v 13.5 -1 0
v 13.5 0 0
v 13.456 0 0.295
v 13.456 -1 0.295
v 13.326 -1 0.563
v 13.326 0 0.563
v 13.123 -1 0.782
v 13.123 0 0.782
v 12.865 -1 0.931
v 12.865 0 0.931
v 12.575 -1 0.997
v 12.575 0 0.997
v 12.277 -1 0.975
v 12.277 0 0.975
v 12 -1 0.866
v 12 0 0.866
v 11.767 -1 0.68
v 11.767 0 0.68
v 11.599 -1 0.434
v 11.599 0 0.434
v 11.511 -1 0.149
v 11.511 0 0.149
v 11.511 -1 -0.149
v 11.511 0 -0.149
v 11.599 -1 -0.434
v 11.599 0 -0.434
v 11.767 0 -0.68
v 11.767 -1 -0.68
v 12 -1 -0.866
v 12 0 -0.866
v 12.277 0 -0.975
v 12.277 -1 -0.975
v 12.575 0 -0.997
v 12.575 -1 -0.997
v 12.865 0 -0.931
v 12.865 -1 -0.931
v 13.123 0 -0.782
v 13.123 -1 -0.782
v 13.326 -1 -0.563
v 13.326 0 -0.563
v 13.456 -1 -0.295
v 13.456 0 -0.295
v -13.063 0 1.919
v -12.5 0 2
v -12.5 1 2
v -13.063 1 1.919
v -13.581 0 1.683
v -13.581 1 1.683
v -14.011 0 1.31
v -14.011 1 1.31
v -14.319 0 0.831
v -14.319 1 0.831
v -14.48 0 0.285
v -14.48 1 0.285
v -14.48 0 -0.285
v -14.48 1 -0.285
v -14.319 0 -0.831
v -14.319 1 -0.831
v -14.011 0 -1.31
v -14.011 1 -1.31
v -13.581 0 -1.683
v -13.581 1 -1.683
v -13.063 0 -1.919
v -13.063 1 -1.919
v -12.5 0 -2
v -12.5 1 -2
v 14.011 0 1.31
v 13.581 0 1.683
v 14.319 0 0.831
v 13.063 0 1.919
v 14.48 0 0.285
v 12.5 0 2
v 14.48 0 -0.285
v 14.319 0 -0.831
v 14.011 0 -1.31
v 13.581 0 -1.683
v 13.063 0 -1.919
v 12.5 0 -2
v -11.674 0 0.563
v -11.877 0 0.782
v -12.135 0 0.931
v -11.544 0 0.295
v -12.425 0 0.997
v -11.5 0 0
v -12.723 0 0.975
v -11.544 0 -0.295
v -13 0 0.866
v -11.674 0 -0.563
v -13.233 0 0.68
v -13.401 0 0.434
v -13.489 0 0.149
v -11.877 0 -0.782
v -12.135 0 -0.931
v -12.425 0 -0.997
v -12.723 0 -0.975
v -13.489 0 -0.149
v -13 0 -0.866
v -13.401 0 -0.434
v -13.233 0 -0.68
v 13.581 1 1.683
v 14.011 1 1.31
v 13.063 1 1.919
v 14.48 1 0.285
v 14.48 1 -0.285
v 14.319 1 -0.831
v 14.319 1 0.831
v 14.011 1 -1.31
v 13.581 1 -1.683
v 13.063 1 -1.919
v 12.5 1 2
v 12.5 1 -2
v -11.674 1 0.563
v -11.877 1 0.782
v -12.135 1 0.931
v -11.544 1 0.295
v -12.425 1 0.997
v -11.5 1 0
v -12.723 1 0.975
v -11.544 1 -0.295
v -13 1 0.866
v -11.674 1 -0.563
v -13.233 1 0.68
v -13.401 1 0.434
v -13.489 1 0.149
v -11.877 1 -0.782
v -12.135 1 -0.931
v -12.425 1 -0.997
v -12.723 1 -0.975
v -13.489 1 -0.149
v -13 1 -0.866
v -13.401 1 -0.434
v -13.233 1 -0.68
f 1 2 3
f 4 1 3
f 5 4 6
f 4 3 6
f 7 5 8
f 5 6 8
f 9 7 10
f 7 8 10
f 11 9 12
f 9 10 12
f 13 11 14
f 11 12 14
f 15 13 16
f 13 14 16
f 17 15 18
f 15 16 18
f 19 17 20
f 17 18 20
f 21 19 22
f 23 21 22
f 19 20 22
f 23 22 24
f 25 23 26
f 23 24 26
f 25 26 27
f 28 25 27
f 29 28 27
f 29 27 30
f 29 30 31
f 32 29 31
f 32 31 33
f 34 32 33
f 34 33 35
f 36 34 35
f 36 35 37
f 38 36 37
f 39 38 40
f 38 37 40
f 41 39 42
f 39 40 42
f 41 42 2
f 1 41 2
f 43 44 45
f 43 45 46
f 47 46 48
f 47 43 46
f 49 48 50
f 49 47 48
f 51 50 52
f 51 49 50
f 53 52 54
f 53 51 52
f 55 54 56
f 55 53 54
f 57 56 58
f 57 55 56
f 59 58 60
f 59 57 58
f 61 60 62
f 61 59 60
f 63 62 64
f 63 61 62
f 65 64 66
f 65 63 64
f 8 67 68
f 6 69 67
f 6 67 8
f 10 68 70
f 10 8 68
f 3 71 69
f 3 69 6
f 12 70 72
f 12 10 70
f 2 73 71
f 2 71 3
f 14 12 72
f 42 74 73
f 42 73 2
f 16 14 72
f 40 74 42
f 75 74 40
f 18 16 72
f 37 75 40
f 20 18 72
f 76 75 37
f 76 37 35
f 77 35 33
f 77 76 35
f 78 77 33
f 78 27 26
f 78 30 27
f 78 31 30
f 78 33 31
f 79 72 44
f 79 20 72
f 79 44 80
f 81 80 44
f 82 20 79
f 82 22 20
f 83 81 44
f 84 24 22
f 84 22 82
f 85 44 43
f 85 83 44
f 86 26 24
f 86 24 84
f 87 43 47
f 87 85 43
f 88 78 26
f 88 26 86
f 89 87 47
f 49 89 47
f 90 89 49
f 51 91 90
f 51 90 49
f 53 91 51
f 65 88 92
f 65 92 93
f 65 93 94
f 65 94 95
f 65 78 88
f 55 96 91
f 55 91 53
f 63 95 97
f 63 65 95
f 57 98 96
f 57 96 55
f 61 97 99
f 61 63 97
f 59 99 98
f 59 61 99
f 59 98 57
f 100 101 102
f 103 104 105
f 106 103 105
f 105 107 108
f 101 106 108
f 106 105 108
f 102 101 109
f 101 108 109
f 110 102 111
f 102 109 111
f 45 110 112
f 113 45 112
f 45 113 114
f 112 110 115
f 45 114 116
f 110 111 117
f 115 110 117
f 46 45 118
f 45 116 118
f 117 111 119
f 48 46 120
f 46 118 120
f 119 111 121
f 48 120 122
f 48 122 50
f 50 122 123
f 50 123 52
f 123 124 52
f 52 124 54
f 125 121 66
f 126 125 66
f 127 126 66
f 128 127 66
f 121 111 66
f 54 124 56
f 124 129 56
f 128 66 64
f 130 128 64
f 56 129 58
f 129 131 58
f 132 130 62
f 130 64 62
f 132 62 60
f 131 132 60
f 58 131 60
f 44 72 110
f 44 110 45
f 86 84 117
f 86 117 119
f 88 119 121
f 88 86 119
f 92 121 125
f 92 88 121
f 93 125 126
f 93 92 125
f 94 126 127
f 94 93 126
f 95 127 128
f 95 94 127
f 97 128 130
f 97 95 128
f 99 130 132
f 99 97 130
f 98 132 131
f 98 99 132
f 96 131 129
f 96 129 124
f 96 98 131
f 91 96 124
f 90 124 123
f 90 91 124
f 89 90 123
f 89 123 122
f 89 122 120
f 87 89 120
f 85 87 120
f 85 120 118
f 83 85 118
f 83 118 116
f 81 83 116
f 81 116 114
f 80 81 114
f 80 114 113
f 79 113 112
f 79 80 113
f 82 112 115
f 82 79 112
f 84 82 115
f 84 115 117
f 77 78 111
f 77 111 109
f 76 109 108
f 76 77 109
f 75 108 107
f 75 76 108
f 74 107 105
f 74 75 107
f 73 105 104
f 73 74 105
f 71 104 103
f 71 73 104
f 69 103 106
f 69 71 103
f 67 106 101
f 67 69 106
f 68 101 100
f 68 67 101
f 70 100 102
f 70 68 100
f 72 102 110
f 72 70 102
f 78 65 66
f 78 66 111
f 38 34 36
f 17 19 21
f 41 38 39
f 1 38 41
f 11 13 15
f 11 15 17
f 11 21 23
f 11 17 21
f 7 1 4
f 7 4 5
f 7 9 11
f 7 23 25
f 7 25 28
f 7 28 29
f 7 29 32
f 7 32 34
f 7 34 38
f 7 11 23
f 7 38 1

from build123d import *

# Parameters (mm, degrees)
SKETCH1_R           = 1
BOSS_EXTRUDE2_DEPTH = 1
SKETCH5_R           = 1
BOSS_EXTRUDE3_DEPTH = 1


with BuildPart() as part:
    # Sketch1 → Boss-Extrude2 (new body)
    with BuildSketch(Plane(origin=(0, 0, 0), x_dir=(1, 0, 0), z_dir=(0, 1, 0))):
        with BuildLine():
            Line((-12.5, 2), (12.5, 2))
            ThreePointArc((12.5, 2), (14.5, 0), (12.5, -2))
            Line((12.5, -2), (-12.5, -2))
            ThreePointArc((-12.5, -2), (-14.5, 0), (-12.5, 2))
        make_face()
        with Locations((-12.5, 0)):
            Circle(SKETCH1_R, mode=Mode.SUBTRACT)
    extrude(amount=BOSS_EXTRUDE2_DEPTH)

    # Sketch5 → Boss-Extrude3 (add)
    with BuildSketch(Plane.XZ):
        with Locations((12.5, 0)):
            Circle(SKETCH5_R)
    extrude(amount=BOSS_EXTRUDE3_DEPTH)


solid = part.part
